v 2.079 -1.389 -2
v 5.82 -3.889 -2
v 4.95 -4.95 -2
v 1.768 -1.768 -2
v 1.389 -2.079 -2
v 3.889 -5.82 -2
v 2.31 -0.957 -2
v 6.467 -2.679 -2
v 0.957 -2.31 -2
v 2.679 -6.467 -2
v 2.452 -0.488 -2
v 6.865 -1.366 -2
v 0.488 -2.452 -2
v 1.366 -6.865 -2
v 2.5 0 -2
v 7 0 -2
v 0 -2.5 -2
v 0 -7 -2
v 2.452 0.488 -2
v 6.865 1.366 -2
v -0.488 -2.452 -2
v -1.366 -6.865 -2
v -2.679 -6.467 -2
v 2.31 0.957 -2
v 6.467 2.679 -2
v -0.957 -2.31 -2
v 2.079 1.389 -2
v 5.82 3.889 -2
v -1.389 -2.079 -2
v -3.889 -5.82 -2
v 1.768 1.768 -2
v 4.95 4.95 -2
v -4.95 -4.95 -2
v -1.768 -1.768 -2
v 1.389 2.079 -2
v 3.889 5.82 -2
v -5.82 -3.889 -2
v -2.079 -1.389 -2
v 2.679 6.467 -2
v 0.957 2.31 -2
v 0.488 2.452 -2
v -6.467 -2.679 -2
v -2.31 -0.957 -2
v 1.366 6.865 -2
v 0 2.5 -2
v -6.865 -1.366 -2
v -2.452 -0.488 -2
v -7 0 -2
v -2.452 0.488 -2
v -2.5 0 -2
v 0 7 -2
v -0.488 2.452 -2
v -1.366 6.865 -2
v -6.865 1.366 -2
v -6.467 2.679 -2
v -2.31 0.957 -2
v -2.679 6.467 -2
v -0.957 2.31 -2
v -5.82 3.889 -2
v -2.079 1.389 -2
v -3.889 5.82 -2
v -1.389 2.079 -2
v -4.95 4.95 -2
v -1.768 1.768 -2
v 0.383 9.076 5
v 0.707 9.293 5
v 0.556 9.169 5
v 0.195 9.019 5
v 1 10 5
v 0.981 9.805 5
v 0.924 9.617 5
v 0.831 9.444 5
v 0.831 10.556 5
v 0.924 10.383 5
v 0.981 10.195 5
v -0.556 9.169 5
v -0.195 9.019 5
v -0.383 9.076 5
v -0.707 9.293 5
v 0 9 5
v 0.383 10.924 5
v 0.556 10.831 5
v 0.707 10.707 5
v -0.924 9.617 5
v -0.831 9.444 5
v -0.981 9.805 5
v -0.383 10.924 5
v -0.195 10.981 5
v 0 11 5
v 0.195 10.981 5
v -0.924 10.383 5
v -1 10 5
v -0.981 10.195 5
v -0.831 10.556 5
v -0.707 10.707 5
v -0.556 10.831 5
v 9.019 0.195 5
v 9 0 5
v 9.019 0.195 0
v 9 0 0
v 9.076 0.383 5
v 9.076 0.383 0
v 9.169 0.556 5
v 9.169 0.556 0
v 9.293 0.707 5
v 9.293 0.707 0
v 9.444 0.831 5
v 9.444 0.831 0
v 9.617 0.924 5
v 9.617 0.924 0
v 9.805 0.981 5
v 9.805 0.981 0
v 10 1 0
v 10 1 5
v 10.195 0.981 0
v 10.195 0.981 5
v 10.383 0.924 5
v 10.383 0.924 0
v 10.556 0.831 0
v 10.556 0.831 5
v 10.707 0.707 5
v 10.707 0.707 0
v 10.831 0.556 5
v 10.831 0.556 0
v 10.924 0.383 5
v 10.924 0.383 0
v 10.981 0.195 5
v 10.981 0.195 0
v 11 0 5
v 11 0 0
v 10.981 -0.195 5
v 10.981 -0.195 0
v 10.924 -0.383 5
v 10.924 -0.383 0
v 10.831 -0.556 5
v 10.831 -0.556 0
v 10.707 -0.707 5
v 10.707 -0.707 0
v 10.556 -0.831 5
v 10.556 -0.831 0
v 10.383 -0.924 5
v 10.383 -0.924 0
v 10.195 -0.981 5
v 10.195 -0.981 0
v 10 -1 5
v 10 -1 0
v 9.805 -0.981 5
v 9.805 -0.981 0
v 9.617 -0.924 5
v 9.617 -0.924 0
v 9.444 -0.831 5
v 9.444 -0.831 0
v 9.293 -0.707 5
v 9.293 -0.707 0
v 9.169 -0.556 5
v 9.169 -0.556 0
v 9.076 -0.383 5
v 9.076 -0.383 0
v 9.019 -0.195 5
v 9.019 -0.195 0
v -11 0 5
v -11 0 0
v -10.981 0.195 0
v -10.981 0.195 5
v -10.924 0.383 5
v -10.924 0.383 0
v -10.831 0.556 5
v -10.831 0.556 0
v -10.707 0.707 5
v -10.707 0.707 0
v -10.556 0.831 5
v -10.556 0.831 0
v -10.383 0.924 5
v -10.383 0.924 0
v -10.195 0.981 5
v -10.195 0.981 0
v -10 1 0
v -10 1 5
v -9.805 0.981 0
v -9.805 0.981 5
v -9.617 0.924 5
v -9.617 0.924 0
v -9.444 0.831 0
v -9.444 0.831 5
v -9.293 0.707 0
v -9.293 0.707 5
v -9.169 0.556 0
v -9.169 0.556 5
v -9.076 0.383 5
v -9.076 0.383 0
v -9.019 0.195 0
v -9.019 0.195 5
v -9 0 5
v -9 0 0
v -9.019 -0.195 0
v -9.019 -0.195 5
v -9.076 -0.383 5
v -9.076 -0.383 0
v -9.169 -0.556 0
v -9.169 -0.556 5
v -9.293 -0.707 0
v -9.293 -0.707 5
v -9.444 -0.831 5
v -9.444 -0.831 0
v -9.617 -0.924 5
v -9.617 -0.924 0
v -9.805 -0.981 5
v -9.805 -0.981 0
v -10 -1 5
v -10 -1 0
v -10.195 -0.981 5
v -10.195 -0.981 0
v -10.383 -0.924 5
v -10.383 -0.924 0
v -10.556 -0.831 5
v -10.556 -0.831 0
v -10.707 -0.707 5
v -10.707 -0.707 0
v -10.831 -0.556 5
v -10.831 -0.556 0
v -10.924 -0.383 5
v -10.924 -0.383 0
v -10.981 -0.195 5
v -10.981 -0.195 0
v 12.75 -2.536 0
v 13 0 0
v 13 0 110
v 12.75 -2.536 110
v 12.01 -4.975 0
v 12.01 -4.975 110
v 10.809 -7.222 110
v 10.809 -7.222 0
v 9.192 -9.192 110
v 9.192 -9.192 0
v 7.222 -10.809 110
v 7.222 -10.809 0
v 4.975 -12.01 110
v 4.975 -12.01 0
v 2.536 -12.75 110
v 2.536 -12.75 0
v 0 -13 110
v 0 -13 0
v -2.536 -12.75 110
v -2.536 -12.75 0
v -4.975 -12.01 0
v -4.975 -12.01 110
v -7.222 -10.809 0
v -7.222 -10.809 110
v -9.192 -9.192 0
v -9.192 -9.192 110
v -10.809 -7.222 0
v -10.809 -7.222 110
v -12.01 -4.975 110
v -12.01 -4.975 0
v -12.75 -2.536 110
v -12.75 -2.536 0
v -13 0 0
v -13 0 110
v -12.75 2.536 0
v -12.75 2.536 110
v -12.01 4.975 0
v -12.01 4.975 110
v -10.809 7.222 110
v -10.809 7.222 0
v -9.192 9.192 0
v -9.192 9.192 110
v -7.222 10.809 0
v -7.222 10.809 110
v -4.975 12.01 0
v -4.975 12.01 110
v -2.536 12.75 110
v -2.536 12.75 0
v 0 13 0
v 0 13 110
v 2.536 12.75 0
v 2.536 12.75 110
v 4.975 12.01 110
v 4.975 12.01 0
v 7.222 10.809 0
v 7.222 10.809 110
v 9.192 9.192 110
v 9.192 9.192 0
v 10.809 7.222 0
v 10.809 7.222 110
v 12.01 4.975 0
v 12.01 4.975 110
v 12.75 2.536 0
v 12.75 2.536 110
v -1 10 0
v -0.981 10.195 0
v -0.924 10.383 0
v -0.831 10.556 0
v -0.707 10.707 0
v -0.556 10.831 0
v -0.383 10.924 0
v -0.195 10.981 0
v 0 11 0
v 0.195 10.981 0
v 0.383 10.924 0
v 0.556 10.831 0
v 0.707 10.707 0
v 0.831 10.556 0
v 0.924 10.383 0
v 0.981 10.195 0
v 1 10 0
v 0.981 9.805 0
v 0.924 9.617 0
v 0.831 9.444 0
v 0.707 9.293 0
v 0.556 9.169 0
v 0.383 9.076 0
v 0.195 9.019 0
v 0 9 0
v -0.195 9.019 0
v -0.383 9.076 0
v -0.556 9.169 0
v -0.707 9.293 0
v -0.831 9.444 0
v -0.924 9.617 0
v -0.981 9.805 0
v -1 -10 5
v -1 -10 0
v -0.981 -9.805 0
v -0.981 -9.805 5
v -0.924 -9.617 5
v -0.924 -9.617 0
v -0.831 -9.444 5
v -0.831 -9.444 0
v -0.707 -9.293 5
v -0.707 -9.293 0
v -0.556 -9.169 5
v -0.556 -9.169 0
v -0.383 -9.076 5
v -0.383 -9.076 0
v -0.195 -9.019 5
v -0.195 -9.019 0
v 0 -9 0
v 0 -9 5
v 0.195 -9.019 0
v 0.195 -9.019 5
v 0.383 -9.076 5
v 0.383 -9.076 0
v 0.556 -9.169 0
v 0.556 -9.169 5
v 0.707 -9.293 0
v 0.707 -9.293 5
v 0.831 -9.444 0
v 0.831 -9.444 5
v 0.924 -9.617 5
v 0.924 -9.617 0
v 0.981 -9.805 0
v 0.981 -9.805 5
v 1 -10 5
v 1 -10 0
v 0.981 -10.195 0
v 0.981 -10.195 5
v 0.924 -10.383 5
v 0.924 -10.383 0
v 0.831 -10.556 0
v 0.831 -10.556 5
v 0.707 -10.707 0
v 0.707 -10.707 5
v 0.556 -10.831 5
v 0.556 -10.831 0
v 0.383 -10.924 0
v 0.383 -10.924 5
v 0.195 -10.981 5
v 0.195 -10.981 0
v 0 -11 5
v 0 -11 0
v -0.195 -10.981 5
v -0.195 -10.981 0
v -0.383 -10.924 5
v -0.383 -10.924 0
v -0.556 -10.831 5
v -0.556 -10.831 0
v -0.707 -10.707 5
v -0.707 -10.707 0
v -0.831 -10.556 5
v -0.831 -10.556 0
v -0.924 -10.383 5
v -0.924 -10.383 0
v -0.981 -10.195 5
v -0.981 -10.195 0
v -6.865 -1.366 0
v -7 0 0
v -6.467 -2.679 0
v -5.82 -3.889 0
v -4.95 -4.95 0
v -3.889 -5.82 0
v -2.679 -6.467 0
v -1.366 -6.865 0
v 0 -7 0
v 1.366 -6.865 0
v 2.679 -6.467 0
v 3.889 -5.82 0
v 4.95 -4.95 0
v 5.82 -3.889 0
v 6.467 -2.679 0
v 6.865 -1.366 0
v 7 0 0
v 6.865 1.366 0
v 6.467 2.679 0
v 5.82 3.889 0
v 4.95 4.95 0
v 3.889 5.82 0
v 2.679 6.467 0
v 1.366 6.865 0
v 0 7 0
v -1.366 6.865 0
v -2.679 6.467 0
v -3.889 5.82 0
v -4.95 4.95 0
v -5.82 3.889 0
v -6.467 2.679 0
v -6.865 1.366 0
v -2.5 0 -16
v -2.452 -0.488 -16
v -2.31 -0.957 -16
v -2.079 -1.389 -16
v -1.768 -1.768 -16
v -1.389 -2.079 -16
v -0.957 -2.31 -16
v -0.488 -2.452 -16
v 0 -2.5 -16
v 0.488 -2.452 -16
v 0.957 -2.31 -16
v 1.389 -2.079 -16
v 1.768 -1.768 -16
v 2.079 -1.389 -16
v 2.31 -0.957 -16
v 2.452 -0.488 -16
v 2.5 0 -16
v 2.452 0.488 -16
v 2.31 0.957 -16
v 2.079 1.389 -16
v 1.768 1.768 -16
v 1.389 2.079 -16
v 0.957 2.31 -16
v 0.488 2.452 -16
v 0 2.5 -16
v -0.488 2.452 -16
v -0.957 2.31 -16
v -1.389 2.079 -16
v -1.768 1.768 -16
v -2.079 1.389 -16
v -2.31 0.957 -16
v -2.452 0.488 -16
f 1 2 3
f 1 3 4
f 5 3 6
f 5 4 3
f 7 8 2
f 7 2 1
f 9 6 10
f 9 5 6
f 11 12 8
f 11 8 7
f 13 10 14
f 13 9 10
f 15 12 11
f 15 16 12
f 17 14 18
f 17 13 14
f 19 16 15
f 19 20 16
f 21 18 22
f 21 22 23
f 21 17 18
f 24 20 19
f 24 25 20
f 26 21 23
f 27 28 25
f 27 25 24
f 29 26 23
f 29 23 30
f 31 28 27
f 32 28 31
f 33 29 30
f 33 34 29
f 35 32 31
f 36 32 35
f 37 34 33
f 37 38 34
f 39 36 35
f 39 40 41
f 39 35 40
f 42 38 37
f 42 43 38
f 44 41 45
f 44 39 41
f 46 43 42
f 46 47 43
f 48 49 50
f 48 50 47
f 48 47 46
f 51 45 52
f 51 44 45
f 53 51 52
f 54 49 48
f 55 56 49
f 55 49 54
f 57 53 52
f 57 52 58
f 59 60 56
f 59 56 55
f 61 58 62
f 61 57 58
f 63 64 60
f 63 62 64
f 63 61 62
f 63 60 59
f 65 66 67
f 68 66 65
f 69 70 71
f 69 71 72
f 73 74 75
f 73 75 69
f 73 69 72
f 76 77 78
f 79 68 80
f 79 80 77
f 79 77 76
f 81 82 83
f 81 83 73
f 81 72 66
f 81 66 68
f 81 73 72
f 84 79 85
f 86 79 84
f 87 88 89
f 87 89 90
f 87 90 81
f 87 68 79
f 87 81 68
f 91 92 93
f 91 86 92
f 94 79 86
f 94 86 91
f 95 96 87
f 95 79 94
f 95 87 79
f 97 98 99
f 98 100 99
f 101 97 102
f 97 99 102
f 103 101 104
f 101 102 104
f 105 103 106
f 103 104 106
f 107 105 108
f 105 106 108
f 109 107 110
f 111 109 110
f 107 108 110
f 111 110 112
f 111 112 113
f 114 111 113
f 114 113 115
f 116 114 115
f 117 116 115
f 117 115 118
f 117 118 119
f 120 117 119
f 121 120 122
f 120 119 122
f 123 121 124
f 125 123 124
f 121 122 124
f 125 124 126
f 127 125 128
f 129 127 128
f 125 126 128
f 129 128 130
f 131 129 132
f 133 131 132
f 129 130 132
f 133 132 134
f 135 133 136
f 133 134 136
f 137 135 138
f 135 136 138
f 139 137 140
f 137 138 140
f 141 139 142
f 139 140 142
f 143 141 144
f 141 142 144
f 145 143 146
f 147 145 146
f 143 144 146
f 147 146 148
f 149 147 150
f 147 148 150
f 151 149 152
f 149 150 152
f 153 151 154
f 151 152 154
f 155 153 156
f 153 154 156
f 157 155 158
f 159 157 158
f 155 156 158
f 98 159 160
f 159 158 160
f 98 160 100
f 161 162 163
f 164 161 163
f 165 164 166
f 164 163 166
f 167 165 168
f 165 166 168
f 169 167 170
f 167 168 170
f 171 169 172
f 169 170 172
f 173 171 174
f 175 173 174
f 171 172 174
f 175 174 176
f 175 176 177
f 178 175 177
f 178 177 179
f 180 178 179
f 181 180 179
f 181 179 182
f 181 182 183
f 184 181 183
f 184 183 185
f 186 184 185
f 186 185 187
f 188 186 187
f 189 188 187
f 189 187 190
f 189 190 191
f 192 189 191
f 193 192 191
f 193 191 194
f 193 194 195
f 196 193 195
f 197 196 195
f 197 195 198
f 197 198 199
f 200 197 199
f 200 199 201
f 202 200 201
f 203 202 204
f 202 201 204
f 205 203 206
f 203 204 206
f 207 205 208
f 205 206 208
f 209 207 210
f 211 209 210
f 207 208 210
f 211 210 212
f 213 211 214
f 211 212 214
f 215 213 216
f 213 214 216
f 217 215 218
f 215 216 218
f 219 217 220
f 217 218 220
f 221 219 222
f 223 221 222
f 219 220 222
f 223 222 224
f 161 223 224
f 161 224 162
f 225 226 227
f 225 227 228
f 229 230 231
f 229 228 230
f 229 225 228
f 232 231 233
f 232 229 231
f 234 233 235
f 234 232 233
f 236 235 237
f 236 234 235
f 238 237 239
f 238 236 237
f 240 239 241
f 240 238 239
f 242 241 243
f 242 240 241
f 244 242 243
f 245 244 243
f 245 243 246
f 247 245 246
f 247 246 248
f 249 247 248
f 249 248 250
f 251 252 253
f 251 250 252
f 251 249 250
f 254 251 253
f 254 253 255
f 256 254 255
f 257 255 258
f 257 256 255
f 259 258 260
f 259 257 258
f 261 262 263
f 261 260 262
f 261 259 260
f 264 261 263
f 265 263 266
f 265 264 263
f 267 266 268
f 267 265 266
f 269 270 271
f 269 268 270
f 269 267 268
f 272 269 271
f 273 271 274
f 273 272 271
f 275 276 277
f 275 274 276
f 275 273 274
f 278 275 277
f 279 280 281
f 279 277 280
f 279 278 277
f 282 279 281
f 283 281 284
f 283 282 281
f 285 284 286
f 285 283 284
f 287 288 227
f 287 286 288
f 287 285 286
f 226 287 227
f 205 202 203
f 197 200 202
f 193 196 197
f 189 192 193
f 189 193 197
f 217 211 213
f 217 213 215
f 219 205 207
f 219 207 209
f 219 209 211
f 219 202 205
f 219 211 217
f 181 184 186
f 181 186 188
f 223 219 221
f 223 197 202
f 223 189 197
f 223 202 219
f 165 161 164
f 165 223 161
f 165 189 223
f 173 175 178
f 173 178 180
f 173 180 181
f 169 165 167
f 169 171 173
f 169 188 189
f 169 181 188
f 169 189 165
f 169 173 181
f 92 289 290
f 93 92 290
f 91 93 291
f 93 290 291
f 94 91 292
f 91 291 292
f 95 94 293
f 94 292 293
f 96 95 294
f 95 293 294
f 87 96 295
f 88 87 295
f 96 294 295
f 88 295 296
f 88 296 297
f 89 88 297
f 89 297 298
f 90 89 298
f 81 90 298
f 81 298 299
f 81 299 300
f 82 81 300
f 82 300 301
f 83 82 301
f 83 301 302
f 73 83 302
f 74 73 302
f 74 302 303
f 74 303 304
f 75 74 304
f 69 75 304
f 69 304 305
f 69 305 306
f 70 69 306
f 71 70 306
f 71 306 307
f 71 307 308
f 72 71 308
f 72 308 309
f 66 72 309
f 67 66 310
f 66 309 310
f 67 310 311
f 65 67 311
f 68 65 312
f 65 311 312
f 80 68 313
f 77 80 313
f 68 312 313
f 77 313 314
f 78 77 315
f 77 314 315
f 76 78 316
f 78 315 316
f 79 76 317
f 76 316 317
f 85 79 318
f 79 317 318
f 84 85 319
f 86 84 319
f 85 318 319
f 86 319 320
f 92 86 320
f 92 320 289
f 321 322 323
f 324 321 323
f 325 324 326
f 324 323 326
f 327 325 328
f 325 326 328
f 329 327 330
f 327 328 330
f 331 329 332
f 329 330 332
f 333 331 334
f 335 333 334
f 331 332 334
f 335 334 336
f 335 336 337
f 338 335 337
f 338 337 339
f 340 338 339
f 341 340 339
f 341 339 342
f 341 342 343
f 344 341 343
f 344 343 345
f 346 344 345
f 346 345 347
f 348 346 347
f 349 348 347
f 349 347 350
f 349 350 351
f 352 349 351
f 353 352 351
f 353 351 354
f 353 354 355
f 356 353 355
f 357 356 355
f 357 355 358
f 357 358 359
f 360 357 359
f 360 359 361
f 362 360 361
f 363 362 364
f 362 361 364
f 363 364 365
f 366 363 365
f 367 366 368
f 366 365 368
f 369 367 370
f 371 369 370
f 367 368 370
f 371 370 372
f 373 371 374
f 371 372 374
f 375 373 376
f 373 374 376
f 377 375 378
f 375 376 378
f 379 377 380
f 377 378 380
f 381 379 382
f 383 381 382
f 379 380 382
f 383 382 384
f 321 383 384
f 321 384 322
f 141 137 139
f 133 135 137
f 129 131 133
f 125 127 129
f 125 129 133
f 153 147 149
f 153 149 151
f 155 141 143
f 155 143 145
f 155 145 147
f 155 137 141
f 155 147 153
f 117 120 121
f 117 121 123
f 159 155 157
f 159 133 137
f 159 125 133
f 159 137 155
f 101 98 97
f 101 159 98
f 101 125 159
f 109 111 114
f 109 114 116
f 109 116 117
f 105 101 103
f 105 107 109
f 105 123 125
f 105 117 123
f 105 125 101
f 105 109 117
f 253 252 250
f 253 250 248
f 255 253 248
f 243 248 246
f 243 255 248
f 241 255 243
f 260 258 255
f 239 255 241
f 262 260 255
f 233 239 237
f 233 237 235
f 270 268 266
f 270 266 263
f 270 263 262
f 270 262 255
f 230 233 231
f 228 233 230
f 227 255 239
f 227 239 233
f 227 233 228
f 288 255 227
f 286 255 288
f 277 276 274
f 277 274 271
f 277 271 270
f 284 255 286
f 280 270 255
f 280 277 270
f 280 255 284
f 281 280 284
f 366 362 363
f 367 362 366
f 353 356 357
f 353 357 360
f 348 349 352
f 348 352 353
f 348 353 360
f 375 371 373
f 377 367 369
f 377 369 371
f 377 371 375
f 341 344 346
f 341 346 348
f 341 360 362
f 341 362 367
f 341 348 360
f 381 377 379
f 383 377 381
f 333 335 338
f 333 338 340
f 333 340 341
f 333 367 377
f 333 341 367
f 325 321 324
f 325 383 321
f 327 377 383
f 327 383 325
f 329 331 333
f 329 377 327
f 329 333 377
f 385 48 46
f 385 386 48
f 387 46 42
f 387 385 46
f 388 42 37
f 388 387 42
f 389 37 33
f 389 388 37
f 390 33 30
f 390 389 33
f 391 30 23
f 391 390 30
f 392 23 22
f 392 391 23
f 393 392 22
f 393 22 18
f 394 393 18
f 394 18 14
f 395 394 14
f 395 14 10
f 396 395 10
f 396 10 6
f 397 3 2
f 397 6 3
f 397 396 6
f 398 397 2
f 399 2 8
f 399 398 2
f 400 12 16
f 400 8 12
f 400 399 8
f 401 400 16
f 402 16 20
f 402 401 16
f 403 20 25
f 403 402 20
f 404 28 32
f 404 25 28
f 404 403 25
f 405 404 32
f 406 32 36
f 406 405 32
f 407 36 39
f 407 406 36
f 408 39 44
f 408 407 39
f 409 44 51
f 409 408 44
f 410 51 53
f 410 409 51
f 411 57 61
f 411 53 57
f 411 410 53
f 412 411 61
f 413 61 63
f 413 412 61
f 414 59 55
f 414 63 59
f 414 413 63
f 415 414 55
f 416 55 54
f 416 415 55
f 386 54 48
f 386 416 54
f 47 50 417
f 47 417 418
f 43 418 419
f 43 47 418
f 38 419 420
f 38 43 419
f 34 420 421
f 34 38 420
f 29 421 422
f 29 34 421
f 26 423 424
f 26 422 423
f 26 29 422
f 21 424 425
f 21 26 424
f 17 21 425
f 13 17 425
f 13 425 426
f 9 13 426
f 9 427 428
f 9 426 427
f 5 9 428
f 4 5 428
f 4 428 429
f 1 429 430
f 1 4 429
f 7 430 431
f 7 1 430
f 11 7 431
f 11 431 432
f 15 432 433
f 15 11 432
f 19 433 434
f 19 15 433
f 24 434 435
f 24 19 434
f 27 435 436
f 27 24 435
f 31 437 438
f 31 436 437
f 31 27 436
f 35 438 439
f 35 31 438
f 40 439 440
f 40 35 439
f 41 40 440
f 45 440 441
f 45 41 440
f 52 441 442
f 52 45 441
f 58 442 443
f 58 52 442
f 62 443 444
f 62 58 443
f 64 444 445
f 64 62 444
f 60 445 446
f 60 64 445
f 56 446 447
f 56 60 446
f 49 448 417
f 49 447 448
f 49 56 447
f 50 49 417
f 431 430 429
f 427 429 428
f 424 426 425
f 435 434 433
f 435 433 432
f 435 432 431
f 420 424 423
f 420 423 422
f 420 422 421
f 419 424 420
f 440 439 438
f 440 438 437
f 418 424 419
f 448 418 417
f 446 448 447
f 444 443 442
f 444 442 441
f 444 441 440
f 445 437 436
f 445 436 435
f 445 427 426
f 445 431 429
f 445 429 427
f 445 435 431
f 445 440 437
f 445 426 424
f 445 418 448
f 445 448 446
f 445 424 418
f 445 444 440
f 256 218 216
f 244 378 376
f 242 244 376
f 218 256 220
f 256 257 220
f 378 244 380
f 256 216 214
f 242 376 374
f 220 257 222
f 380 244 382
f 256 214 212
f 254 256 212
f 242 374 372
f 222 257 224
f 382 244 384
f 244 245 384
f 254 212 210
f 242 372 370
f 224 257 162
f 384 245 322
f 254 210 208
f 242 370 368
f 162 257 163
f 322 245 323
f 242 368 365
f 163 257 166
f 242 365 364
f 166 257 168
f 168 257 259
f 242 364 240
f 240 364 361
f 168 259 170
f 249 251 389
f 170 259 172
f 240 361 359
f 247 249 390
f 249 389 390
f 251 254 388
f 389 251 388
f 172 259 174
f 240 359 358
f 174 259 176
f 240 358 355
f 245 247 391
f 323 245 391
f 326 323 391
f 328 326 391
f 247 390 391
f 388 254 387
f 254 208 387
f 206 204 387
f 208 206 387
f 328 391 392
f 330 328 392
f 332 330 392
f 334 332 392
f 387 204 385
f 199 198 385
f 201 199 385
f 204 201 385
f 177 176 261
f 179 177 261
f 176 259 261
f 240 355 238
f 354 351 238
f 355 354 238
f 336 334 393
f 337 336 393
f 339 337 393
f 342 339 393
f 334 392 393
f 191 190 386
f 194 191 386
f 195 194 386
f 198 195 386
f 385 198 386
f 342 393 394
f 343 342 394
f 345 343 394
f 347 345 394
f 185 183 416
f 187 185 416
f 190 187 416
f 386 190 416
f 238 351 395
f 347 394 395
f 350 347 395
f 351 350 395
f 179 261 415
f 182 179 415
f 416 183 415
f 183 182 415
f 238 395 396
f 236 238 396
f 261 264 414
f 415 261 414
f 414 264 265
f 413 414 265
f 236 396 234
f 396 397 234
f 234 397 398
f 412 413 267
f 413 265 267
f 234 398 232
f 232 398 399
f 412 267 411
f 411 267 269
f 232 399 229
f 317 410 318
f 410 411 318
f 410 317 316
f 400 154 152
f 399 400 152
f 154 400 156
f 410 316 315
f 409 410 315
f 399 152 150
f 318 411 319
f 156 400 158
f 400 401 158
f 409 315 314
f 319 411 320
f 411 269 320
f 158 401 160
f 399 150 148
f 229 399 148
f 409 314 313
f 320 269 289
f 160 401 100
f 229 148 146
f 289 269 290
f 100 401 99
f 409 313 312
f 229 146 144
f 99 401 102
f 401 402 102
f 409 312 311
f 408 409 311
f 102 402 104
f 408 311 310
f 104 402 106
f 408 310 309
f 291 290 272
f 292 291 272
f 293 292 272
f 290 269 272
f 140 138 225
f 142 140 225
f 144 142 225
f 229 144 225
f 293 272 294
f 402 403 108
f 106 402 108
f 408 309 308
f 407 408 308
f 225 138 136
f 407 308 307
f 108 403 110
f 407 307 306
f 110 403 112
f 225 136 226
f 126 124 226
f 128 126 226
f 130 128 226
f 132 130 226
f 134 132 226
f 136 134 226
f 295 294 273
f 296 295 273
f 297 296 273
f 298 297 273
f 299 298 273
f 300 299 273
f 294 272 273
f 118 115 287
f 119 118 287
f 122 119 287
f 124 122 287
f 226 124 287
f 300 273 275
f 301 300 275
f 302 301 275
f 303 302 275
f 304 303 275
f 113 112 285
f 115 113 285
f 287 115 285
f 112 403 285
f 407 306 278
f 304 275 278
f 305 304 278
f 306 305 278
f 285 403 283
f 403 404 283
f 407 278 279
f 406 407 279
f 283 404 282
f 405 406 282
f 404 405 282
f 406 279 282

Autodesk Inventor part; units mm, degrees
ref_plane "YZ Plane" through (0, 0, 0) normal (1, 0, 0) x (0, 1, 0)
ref_plane "XZ Plane" through (0, 0, 0) normal (0, 1, 0) x (-1, 0, 0)
ref_plane "XY Plane" through (0, 0, 0) normal (0, 0, 1) x (1, 0, 0)
sketch "Esquisse1" plane through (0, 0, 0) normal (0, 0, 1) x (1, 0, 0)
  circle A0 centre (0, 0) radius 13
  dimension "d0" = 26
extrude "Extrusion1" add sketch "Esquisse1" along normal blind 110
sketch "Esquisse2" plane through (0, 0, 0) normal (0, 0, -1) x (-1, 0, 0)
  circle A0 centre (0, 0) radius 7
  circle A1 centre (0, 10) radius 1
  circle A2 centre (0, 0) radius 13 projected
  circle A3 centre (-10, 0) radius 1
  circle A4 centre (0, -10) radius 1
  circle A5 centre (10, 0) radius 1
  dimension "d3" = 14
  dimension "d4" = 2
  dimension "d5" = 2
  dimension "d8" = 360
extrude "Extrusion2" cut sketch "Esquisse2" against normal blind 5 contours A1 | A3 | A4 | A5
sketch "Esquisse3" plane through (0, 0, 0) normal (0, 0, -1) x (-1, 0, 0)
  circle A0 centre (0, 0) radius 7
  dimension "d12" = 14
extrude "Extrusion3" add sketch "Esquisse3" along normal blind 2
sketch "Esquisse4" plane through (0, 0, -2) normal (0, 0, -1) x (-1, 0, 0)
  circle A0 centre (0, 0) radius 2.5
  dimension "d15" = 5
extrude "Extrusion4" add sketch "Esquisse4" along normal blind 14
properties part number "MoteurMaxon"
